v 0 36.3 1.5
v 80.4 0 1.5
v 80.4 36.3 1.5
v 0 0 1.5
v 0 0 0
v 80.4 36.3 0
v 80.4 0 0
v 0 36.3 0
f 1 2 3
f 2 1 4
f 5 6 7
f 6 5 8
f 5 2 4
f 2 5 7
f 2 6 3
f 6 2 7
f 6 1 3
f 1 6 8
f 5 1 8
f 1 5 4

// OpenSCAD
$fn = 64;

board_x = 80.4;
board_y = 36.3;
board_z = 1.5;

color([0.05, 0.35, 0.12])
cube([board_x, board_y, board_z], center=false);
